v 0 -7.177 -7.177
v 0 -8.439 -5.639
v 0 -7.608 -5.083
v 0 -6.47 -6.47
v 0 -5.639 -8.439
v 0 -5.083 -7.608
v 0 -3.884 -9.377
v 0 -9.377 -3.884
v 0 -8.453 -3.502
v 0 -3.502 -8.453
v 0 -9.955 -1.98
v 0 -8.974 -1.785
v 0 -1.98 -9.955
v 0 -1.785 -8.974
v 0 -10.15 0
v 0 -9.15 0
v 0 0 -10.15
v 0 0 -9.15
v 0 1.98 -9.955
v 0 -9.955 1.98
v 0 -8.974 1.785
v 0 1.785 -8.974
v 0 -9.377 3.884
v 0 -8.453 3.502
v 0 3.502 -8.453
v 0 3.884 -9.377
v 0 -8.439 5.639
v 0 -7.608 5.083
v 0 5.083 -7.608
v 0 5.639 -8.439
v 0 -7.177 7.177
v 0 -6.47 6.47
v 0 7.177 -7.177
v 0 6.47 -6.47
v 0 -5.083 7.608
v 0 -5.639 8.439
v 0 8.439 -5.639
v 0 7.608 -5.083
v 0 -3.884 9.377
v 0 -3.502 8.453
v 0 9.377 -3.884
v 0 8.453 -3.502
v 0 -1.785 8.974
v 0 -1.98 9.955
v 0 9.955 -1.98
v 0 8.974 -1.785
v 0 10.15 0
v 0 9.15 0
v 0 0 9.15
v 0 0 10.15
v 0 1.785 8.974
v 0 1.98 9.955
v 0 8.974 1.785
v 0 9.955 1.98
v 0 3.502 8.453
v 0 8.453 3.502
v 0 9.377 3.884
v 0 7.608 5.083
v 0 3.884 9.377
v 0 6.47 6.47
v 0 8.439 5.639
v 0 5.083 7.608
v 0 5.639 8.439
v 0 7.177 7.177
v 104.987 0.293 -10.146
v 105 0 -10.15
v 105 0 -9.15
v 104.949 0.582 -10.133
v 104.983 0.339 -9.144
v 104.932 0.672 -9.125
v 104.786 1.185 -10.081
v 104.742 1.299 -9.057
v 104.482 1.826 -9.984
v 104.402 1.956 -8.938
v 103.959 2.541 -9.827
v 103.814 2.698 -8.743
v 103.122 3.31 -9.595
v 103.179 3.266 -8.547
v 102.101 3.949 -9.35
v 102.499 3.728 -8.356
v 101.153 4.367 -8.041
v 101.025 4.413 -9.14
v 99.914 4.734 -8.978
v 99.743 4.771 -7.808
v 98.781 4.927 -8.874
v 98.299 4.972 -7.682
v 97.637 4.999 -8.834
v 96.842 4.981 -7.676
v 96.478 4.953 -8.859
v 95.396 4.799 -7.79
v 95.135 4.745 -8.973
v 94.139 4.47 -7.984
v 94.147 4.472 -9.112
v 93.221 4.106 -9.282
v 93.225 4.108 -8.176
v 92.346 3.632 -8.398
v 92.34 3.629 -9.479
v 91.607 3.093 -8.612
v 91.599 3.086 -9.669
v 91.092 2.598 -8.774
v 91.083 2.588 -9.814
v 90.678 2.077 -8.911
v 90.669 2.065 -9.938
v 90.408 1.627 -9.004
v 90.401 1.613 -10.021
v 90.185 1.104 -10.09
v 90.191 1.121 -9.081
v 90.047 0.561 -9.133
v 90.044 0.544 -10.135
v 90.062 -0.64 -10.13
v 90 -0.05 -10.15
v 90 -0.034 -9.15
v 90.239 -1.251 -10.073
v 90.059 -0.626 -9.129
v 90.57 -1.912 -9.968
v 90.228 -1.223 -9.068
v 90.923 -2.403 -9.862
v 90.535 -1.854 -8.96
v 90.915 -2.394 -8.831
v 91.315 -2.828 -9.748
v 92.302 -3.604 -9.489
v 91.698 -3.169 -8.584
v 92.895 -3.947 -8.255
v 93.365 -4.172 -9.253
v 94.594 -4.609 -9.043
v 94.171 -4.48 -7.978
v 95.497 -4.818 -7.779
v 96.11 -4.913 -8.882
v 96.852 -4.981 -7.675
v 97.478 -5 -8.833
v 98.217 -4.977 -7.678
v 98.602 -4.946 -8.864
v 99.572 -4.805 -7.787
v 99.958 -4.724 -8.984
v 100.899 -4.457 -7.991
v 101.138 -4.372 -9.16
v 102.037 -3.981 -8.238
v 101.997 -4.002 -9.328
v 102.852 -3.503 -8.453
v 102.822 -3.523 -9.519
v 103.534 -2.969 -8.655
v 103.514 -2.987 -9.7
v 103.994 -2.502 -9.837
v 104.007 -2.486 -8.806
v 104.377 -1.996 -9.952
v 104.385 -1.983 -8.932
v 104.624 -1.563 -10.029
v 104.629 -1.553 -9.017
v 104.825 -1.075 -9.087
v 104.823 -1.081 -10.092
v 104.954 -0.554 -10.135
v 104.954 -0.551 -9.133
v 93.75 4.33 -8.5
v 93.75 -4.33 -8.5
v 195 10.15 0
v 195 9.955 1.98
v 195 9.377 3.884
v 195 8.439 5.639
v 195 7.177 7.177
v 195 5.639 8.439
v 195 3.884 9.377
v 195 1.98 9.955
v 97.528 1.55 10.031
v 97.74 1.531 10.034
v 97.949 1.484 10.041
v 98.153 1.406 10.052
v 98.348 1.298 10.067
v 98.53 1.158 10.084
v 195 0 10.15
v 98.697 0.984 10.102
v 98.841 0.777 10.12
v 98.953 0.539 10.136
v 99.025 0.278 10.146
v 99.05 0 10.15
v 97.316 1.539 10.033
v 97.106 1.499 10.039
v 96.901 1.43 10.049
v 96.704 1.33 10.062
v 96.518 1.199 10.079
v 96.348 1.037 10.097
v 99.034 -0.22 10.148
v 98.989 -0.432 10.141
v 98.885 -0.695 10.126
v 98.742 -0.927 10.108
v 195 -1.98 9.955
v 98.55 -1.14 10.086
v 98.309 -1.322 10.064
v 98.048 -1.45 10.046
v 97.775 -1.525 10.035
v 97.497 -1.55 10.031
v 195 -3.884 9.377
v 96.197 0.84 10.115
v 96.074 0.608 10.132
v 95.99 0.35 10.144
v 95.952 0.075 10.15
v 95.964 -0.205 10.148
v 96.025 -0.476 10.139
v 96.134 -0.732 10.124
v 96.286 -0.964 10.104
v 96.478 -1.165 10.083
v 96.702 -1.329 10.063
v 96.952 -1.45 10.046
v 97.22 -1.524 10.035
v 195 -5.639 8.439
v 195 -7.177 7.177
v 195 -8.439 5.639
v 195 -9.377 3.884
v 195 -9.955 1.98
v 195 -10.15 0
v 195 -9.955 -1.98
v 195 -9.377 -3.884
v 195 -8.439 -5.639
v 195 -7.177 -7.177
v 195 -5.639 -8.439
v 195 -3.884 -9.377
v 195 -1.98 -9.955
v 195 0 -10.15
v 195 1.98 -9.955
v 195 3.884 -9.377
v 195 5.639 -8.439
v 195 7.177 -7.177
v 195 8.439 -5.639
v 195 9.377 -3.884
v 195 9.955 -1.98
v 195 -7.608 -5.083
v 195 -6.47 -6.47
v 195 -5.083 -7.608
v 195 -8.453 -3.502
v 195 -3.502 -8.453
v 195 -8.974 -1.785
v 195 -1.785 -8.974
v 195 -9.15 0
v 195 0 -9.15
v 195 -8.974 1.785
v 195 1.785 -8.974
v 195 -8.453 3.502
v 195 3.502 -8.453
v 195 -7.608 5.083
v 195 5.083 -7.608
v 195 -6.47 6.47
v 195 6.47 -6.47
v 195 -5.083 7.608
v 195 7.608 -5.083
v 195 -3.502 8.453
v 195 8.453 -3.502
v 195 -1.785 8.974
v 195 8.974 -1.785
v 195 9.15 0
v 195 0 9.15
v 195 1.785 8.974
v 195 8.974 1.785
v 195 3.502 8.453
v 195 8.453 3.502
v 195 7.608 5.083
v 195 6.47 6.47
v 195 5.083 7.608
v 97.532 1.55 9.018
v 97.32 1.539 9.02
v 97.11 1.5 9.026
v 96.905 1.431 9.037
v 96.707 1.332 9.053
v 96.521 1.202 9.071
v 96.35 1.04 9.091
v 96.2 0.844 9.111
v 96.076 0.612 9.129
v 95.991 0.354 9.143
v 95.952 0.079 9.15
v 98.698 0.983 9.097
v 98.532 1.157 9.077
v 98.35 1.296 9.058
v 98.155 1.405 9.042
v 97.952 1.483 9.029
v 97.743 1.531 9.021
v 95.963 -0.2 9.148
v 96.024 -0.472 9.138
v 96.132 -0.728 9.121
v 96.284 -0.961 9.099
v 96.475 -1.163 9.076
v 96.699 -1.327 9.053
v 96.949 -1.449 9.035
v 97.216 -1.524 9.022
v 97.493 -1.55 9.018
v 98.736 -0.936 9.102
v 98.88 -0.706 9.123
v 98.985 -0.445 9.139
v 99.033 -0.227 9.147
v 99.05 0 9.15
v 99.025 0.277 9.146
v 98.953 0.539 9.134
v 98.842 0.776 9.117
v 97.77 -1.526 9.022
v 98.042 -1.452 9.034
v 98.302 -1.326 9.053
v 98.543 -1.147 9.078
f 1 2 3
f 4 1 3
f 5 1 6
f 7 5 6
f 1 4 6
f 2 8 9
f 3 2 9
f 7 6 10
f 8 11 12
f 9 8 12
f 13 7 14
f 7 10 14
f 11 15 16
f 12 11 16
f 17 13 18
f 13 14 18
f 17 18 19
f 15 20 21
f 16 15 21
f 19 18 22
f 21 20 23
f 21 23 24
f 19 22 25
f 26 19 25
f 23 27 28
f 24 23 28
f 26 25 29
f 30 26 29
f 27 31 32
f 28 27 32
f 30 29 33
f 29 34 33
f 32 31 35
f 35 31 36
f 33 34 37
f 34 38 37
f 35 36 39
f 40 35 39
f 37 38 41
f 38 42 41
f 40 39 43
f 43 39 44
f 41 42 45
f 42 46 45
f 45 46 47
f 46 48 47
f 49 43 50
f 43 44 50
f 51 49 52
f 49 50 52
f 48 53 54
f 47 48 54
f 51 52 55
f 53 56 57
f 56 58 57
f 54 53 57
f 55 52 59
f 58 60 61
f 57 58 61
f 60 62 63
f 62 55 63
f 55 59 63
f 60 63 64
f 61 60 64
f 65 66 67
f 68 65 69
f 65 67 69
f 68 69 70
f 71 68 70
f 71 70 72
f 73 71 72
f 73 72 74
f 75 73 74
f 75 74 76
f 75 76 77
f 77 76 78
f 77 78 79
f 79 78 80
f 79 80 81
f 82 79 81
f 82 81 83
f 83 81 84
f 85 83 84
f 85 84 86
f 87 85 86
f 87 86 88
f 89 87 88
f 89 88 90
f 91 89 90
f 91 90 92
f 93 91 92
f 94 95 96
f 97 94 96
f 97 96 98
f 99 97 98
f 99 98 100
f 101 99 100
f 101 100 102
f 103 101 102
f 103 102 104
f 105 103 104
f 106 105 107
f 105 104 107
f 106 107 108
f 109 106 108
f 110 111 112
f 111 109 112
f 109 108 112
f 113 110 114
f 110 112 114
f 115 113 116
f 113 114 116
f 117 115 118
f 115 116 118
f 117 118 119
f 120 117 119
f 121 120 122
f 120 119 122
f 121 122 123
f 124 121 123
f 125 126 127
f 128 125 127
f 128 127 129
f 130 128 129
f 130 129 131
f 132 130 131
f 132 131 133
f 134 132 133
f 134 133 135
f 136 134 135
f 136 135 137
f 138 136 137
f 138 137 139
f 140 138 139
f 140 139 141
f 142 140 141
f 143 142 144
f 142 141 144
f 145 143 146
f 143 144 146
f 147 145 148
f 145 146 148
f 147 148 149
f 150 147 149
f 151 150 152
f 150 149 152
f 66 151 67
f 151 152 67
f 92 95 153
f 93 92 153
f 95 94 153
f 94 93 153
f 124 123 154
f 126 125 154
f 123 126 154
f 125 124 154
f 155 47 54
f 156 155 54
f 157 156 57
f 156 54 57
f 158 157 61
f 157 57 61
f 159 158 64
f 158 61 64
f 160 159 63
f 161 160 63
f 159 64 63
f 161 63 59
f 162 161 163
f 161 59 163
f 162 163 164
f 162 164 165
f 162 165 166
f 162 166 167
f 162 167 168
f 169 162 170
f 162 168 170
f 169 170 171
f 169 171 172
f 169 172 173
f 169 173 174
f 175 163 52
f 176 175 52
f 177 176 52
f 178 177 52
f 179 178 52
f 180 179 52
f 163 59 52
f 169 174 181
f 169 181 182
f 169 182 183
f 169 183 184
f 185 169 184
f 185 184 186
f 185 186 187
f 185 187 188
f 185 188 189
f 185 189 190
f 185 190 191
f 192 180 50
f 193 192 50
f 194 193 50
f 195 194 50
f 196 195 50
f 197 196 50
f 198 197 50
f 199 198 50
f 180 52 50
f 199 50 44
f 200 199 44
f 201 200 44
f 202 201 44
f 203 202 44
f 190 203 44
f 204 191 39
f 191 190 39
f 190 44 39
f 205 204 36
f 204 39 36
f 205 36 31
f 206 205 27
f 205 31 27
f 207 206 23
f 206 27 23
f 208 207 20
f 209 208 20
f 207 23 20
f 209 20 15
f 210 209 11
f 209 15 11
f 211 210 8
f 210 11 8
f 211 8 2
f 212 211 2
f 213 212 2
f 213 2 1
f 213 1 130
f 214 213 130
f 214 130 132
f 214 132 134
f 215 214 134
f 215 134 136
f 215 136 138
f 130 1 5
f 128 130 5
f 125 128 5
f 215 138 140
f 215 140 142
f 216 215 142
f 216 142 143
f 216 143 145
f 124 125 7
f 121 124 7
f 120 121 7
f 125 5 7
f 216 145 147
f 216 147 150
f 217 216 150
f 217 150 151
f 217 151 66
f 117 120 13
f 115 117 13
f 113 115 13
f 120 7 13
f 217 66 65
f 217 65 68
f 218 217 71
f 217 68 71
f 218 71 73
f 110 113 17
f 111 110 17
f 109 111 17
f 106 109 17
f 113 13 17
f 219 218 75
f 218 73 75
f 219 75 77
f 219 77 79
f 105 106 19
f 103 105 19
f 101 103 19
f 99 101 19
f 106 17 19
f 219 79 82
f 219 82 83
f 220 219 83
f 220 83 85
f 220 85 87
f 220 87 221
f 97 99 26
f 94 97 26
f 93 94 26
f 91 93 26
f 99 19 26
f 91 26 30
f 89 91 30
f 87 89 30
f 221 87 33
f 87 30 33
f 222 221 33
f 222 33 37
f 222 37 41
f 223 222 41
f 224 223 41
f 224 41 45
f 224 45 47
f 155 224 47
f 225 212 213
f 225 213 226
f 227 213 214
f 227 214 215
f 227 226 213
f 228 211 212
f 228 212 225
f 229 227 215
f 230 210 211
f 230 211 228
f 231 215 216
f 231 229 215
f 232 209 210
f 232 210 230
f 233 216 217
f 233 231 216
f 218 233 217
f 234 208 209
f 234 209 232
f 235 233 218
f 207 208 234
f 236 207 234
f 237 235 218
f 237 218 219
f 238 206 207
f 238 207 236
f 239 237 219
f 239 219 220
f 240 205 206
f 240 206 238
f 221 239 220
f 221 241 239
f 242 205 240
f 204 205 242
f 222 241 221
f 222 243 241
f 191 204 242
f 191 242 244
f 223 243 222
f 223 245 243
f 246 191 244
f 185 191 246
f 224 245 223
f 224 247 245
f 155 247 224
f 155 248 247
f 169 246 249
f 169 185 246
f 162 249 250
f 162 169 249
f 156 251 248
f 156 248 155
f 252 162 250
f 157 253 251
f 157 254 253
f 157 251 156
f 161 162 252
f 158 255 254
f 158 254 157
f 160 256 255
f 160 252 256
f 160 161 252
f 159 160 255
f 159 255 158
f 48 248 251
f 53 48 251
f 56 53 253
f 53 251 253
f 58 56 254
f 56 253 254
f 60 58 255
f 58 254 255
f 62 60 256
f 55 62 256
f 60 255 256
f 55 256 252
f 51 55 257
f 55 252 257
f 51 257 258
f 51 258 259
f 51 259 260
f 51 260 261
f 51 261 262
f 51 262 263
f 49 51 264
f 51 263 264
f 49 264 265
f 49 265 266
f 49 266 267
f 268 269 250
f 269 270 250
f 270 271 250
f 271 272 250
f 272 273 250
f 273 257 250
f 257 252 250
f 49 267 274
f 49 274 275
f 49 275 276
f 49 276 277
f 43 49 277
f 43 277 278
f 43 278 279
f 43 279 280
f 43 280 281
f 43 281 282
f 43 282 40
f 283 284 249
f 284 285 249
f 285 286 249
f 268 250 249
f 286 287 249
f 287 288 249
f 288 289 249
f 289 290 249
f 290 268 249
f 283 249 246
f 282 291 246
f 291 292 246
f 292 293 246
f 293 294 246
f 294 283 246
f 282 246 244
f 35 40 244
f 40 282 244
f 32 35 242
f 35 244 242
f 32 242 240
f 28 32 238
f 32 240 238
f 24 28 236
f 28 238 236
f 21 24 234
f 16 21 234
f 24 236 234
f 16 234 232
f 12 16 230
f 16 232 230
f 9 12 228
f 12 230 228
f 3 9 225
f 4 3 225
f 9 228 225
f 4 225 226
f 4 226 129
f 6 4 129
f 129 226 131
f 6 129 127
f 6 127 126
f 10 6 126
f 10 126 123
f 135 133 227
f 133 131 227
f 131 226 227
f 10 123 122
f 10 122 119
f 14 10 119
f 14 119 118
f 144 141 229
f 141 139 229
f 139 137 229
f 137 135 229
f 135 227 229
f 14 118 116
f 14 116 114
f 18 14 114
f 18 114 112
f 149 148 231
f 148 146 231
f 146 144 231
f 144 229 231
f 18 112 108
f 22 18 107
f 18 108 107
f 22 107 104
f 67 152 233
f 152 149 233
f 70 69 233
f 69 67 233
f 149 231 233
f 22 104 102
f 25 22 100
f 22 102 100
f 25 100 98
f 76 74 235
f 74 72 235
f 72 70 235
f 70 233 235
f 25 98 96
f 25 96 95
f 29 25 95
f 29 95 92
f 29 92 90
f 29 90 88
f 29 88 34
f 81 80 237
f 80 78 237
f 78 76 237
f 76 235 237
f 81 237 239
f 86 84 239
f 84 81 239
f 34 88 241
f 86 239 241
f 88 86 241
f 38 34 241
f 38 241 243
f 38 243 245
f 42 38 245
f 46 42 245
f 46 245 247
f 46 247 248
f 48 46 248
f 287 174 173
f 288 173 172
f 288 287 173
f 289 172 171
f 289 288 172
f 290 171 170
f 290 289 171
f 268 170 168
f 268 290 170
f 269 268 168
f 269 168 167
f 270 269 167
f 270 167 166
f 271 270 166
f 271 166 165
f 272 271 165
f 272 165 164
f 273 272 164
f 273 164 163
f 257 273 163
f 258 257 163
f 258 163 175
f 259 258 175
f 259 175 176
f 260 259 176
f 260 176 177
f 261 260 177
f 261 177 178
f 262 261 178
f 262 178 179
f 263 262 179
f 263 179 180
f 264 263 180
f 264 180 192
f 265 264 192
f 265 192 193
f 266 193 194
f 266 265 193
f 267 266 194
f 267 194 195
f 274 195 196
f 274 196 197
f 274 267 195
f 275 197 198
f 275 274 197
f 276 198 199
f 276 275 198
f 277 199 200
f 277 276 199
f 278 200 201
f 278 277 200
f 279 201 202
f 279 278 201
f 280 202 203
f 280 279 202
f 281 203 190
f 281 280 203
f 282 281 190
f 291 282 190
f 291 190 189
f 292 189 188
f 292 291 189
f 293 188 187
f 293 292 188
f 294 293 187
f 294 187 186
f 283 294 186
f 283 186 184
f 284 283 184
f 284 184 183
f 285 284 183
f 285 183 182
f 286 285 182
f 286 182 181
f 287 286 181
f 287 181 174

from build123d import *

# Parameters (mm, degrees)
F0_R     = 10.15
F1_DEPTH = 195
F2_R     = 9.15
F3_DEPTH = 195.001
F5_DEPTH = 10.151
F6_R     = 1.55
F7_DEPTH = 10.151


with BuildPart() as f1:
    # F0 (on Right) → F1 (new body)
    with BuildSketch(Plane.YZ):
        Circle(F0_R)
    extrude(amount=F1_DEPTH)

    # F2 (on face) → F3 (cut, through all)
    with BuildSketch(Plane.YZ.offset(195)):
        Circle(F2_R)
    extrude(amount=-F3_DEPTH, mode=Mode.SUBTRACT)

    # F4 (on Top) → F5 (cut, through all)
    with BuildSketch(Plane.XY):
        with BuildLine():
            add(Edge.make_bspline(
                [(105, 0), (105, 8.660254), (93.75, 4.330127), (82.5, 0), (93.75, -4.330127), (105, -8.660254), (105, 0)],
                knots=[0, 0, 0, 2.094395, 2.094395, 4.18879, 4.18879, 6.283185, 6.283185, 6.283185], degree=2, weights=[1, 0.5, 1, 0.5, 1, 0.5, 1]))
        make_face()
    extrude(amount=-F5_DEPTH, mode=Mode.SUBTRACT)

    # F6 (on Top) → F7 (cut, through all)
    with BuildSketch(Plane.XY):
        with Locations((97.5, 0)):
            Circle(F6_R)
    extrude(amount=F7_DEPTH, mode=Mode.SUBTRACT)


solid = f1.part
